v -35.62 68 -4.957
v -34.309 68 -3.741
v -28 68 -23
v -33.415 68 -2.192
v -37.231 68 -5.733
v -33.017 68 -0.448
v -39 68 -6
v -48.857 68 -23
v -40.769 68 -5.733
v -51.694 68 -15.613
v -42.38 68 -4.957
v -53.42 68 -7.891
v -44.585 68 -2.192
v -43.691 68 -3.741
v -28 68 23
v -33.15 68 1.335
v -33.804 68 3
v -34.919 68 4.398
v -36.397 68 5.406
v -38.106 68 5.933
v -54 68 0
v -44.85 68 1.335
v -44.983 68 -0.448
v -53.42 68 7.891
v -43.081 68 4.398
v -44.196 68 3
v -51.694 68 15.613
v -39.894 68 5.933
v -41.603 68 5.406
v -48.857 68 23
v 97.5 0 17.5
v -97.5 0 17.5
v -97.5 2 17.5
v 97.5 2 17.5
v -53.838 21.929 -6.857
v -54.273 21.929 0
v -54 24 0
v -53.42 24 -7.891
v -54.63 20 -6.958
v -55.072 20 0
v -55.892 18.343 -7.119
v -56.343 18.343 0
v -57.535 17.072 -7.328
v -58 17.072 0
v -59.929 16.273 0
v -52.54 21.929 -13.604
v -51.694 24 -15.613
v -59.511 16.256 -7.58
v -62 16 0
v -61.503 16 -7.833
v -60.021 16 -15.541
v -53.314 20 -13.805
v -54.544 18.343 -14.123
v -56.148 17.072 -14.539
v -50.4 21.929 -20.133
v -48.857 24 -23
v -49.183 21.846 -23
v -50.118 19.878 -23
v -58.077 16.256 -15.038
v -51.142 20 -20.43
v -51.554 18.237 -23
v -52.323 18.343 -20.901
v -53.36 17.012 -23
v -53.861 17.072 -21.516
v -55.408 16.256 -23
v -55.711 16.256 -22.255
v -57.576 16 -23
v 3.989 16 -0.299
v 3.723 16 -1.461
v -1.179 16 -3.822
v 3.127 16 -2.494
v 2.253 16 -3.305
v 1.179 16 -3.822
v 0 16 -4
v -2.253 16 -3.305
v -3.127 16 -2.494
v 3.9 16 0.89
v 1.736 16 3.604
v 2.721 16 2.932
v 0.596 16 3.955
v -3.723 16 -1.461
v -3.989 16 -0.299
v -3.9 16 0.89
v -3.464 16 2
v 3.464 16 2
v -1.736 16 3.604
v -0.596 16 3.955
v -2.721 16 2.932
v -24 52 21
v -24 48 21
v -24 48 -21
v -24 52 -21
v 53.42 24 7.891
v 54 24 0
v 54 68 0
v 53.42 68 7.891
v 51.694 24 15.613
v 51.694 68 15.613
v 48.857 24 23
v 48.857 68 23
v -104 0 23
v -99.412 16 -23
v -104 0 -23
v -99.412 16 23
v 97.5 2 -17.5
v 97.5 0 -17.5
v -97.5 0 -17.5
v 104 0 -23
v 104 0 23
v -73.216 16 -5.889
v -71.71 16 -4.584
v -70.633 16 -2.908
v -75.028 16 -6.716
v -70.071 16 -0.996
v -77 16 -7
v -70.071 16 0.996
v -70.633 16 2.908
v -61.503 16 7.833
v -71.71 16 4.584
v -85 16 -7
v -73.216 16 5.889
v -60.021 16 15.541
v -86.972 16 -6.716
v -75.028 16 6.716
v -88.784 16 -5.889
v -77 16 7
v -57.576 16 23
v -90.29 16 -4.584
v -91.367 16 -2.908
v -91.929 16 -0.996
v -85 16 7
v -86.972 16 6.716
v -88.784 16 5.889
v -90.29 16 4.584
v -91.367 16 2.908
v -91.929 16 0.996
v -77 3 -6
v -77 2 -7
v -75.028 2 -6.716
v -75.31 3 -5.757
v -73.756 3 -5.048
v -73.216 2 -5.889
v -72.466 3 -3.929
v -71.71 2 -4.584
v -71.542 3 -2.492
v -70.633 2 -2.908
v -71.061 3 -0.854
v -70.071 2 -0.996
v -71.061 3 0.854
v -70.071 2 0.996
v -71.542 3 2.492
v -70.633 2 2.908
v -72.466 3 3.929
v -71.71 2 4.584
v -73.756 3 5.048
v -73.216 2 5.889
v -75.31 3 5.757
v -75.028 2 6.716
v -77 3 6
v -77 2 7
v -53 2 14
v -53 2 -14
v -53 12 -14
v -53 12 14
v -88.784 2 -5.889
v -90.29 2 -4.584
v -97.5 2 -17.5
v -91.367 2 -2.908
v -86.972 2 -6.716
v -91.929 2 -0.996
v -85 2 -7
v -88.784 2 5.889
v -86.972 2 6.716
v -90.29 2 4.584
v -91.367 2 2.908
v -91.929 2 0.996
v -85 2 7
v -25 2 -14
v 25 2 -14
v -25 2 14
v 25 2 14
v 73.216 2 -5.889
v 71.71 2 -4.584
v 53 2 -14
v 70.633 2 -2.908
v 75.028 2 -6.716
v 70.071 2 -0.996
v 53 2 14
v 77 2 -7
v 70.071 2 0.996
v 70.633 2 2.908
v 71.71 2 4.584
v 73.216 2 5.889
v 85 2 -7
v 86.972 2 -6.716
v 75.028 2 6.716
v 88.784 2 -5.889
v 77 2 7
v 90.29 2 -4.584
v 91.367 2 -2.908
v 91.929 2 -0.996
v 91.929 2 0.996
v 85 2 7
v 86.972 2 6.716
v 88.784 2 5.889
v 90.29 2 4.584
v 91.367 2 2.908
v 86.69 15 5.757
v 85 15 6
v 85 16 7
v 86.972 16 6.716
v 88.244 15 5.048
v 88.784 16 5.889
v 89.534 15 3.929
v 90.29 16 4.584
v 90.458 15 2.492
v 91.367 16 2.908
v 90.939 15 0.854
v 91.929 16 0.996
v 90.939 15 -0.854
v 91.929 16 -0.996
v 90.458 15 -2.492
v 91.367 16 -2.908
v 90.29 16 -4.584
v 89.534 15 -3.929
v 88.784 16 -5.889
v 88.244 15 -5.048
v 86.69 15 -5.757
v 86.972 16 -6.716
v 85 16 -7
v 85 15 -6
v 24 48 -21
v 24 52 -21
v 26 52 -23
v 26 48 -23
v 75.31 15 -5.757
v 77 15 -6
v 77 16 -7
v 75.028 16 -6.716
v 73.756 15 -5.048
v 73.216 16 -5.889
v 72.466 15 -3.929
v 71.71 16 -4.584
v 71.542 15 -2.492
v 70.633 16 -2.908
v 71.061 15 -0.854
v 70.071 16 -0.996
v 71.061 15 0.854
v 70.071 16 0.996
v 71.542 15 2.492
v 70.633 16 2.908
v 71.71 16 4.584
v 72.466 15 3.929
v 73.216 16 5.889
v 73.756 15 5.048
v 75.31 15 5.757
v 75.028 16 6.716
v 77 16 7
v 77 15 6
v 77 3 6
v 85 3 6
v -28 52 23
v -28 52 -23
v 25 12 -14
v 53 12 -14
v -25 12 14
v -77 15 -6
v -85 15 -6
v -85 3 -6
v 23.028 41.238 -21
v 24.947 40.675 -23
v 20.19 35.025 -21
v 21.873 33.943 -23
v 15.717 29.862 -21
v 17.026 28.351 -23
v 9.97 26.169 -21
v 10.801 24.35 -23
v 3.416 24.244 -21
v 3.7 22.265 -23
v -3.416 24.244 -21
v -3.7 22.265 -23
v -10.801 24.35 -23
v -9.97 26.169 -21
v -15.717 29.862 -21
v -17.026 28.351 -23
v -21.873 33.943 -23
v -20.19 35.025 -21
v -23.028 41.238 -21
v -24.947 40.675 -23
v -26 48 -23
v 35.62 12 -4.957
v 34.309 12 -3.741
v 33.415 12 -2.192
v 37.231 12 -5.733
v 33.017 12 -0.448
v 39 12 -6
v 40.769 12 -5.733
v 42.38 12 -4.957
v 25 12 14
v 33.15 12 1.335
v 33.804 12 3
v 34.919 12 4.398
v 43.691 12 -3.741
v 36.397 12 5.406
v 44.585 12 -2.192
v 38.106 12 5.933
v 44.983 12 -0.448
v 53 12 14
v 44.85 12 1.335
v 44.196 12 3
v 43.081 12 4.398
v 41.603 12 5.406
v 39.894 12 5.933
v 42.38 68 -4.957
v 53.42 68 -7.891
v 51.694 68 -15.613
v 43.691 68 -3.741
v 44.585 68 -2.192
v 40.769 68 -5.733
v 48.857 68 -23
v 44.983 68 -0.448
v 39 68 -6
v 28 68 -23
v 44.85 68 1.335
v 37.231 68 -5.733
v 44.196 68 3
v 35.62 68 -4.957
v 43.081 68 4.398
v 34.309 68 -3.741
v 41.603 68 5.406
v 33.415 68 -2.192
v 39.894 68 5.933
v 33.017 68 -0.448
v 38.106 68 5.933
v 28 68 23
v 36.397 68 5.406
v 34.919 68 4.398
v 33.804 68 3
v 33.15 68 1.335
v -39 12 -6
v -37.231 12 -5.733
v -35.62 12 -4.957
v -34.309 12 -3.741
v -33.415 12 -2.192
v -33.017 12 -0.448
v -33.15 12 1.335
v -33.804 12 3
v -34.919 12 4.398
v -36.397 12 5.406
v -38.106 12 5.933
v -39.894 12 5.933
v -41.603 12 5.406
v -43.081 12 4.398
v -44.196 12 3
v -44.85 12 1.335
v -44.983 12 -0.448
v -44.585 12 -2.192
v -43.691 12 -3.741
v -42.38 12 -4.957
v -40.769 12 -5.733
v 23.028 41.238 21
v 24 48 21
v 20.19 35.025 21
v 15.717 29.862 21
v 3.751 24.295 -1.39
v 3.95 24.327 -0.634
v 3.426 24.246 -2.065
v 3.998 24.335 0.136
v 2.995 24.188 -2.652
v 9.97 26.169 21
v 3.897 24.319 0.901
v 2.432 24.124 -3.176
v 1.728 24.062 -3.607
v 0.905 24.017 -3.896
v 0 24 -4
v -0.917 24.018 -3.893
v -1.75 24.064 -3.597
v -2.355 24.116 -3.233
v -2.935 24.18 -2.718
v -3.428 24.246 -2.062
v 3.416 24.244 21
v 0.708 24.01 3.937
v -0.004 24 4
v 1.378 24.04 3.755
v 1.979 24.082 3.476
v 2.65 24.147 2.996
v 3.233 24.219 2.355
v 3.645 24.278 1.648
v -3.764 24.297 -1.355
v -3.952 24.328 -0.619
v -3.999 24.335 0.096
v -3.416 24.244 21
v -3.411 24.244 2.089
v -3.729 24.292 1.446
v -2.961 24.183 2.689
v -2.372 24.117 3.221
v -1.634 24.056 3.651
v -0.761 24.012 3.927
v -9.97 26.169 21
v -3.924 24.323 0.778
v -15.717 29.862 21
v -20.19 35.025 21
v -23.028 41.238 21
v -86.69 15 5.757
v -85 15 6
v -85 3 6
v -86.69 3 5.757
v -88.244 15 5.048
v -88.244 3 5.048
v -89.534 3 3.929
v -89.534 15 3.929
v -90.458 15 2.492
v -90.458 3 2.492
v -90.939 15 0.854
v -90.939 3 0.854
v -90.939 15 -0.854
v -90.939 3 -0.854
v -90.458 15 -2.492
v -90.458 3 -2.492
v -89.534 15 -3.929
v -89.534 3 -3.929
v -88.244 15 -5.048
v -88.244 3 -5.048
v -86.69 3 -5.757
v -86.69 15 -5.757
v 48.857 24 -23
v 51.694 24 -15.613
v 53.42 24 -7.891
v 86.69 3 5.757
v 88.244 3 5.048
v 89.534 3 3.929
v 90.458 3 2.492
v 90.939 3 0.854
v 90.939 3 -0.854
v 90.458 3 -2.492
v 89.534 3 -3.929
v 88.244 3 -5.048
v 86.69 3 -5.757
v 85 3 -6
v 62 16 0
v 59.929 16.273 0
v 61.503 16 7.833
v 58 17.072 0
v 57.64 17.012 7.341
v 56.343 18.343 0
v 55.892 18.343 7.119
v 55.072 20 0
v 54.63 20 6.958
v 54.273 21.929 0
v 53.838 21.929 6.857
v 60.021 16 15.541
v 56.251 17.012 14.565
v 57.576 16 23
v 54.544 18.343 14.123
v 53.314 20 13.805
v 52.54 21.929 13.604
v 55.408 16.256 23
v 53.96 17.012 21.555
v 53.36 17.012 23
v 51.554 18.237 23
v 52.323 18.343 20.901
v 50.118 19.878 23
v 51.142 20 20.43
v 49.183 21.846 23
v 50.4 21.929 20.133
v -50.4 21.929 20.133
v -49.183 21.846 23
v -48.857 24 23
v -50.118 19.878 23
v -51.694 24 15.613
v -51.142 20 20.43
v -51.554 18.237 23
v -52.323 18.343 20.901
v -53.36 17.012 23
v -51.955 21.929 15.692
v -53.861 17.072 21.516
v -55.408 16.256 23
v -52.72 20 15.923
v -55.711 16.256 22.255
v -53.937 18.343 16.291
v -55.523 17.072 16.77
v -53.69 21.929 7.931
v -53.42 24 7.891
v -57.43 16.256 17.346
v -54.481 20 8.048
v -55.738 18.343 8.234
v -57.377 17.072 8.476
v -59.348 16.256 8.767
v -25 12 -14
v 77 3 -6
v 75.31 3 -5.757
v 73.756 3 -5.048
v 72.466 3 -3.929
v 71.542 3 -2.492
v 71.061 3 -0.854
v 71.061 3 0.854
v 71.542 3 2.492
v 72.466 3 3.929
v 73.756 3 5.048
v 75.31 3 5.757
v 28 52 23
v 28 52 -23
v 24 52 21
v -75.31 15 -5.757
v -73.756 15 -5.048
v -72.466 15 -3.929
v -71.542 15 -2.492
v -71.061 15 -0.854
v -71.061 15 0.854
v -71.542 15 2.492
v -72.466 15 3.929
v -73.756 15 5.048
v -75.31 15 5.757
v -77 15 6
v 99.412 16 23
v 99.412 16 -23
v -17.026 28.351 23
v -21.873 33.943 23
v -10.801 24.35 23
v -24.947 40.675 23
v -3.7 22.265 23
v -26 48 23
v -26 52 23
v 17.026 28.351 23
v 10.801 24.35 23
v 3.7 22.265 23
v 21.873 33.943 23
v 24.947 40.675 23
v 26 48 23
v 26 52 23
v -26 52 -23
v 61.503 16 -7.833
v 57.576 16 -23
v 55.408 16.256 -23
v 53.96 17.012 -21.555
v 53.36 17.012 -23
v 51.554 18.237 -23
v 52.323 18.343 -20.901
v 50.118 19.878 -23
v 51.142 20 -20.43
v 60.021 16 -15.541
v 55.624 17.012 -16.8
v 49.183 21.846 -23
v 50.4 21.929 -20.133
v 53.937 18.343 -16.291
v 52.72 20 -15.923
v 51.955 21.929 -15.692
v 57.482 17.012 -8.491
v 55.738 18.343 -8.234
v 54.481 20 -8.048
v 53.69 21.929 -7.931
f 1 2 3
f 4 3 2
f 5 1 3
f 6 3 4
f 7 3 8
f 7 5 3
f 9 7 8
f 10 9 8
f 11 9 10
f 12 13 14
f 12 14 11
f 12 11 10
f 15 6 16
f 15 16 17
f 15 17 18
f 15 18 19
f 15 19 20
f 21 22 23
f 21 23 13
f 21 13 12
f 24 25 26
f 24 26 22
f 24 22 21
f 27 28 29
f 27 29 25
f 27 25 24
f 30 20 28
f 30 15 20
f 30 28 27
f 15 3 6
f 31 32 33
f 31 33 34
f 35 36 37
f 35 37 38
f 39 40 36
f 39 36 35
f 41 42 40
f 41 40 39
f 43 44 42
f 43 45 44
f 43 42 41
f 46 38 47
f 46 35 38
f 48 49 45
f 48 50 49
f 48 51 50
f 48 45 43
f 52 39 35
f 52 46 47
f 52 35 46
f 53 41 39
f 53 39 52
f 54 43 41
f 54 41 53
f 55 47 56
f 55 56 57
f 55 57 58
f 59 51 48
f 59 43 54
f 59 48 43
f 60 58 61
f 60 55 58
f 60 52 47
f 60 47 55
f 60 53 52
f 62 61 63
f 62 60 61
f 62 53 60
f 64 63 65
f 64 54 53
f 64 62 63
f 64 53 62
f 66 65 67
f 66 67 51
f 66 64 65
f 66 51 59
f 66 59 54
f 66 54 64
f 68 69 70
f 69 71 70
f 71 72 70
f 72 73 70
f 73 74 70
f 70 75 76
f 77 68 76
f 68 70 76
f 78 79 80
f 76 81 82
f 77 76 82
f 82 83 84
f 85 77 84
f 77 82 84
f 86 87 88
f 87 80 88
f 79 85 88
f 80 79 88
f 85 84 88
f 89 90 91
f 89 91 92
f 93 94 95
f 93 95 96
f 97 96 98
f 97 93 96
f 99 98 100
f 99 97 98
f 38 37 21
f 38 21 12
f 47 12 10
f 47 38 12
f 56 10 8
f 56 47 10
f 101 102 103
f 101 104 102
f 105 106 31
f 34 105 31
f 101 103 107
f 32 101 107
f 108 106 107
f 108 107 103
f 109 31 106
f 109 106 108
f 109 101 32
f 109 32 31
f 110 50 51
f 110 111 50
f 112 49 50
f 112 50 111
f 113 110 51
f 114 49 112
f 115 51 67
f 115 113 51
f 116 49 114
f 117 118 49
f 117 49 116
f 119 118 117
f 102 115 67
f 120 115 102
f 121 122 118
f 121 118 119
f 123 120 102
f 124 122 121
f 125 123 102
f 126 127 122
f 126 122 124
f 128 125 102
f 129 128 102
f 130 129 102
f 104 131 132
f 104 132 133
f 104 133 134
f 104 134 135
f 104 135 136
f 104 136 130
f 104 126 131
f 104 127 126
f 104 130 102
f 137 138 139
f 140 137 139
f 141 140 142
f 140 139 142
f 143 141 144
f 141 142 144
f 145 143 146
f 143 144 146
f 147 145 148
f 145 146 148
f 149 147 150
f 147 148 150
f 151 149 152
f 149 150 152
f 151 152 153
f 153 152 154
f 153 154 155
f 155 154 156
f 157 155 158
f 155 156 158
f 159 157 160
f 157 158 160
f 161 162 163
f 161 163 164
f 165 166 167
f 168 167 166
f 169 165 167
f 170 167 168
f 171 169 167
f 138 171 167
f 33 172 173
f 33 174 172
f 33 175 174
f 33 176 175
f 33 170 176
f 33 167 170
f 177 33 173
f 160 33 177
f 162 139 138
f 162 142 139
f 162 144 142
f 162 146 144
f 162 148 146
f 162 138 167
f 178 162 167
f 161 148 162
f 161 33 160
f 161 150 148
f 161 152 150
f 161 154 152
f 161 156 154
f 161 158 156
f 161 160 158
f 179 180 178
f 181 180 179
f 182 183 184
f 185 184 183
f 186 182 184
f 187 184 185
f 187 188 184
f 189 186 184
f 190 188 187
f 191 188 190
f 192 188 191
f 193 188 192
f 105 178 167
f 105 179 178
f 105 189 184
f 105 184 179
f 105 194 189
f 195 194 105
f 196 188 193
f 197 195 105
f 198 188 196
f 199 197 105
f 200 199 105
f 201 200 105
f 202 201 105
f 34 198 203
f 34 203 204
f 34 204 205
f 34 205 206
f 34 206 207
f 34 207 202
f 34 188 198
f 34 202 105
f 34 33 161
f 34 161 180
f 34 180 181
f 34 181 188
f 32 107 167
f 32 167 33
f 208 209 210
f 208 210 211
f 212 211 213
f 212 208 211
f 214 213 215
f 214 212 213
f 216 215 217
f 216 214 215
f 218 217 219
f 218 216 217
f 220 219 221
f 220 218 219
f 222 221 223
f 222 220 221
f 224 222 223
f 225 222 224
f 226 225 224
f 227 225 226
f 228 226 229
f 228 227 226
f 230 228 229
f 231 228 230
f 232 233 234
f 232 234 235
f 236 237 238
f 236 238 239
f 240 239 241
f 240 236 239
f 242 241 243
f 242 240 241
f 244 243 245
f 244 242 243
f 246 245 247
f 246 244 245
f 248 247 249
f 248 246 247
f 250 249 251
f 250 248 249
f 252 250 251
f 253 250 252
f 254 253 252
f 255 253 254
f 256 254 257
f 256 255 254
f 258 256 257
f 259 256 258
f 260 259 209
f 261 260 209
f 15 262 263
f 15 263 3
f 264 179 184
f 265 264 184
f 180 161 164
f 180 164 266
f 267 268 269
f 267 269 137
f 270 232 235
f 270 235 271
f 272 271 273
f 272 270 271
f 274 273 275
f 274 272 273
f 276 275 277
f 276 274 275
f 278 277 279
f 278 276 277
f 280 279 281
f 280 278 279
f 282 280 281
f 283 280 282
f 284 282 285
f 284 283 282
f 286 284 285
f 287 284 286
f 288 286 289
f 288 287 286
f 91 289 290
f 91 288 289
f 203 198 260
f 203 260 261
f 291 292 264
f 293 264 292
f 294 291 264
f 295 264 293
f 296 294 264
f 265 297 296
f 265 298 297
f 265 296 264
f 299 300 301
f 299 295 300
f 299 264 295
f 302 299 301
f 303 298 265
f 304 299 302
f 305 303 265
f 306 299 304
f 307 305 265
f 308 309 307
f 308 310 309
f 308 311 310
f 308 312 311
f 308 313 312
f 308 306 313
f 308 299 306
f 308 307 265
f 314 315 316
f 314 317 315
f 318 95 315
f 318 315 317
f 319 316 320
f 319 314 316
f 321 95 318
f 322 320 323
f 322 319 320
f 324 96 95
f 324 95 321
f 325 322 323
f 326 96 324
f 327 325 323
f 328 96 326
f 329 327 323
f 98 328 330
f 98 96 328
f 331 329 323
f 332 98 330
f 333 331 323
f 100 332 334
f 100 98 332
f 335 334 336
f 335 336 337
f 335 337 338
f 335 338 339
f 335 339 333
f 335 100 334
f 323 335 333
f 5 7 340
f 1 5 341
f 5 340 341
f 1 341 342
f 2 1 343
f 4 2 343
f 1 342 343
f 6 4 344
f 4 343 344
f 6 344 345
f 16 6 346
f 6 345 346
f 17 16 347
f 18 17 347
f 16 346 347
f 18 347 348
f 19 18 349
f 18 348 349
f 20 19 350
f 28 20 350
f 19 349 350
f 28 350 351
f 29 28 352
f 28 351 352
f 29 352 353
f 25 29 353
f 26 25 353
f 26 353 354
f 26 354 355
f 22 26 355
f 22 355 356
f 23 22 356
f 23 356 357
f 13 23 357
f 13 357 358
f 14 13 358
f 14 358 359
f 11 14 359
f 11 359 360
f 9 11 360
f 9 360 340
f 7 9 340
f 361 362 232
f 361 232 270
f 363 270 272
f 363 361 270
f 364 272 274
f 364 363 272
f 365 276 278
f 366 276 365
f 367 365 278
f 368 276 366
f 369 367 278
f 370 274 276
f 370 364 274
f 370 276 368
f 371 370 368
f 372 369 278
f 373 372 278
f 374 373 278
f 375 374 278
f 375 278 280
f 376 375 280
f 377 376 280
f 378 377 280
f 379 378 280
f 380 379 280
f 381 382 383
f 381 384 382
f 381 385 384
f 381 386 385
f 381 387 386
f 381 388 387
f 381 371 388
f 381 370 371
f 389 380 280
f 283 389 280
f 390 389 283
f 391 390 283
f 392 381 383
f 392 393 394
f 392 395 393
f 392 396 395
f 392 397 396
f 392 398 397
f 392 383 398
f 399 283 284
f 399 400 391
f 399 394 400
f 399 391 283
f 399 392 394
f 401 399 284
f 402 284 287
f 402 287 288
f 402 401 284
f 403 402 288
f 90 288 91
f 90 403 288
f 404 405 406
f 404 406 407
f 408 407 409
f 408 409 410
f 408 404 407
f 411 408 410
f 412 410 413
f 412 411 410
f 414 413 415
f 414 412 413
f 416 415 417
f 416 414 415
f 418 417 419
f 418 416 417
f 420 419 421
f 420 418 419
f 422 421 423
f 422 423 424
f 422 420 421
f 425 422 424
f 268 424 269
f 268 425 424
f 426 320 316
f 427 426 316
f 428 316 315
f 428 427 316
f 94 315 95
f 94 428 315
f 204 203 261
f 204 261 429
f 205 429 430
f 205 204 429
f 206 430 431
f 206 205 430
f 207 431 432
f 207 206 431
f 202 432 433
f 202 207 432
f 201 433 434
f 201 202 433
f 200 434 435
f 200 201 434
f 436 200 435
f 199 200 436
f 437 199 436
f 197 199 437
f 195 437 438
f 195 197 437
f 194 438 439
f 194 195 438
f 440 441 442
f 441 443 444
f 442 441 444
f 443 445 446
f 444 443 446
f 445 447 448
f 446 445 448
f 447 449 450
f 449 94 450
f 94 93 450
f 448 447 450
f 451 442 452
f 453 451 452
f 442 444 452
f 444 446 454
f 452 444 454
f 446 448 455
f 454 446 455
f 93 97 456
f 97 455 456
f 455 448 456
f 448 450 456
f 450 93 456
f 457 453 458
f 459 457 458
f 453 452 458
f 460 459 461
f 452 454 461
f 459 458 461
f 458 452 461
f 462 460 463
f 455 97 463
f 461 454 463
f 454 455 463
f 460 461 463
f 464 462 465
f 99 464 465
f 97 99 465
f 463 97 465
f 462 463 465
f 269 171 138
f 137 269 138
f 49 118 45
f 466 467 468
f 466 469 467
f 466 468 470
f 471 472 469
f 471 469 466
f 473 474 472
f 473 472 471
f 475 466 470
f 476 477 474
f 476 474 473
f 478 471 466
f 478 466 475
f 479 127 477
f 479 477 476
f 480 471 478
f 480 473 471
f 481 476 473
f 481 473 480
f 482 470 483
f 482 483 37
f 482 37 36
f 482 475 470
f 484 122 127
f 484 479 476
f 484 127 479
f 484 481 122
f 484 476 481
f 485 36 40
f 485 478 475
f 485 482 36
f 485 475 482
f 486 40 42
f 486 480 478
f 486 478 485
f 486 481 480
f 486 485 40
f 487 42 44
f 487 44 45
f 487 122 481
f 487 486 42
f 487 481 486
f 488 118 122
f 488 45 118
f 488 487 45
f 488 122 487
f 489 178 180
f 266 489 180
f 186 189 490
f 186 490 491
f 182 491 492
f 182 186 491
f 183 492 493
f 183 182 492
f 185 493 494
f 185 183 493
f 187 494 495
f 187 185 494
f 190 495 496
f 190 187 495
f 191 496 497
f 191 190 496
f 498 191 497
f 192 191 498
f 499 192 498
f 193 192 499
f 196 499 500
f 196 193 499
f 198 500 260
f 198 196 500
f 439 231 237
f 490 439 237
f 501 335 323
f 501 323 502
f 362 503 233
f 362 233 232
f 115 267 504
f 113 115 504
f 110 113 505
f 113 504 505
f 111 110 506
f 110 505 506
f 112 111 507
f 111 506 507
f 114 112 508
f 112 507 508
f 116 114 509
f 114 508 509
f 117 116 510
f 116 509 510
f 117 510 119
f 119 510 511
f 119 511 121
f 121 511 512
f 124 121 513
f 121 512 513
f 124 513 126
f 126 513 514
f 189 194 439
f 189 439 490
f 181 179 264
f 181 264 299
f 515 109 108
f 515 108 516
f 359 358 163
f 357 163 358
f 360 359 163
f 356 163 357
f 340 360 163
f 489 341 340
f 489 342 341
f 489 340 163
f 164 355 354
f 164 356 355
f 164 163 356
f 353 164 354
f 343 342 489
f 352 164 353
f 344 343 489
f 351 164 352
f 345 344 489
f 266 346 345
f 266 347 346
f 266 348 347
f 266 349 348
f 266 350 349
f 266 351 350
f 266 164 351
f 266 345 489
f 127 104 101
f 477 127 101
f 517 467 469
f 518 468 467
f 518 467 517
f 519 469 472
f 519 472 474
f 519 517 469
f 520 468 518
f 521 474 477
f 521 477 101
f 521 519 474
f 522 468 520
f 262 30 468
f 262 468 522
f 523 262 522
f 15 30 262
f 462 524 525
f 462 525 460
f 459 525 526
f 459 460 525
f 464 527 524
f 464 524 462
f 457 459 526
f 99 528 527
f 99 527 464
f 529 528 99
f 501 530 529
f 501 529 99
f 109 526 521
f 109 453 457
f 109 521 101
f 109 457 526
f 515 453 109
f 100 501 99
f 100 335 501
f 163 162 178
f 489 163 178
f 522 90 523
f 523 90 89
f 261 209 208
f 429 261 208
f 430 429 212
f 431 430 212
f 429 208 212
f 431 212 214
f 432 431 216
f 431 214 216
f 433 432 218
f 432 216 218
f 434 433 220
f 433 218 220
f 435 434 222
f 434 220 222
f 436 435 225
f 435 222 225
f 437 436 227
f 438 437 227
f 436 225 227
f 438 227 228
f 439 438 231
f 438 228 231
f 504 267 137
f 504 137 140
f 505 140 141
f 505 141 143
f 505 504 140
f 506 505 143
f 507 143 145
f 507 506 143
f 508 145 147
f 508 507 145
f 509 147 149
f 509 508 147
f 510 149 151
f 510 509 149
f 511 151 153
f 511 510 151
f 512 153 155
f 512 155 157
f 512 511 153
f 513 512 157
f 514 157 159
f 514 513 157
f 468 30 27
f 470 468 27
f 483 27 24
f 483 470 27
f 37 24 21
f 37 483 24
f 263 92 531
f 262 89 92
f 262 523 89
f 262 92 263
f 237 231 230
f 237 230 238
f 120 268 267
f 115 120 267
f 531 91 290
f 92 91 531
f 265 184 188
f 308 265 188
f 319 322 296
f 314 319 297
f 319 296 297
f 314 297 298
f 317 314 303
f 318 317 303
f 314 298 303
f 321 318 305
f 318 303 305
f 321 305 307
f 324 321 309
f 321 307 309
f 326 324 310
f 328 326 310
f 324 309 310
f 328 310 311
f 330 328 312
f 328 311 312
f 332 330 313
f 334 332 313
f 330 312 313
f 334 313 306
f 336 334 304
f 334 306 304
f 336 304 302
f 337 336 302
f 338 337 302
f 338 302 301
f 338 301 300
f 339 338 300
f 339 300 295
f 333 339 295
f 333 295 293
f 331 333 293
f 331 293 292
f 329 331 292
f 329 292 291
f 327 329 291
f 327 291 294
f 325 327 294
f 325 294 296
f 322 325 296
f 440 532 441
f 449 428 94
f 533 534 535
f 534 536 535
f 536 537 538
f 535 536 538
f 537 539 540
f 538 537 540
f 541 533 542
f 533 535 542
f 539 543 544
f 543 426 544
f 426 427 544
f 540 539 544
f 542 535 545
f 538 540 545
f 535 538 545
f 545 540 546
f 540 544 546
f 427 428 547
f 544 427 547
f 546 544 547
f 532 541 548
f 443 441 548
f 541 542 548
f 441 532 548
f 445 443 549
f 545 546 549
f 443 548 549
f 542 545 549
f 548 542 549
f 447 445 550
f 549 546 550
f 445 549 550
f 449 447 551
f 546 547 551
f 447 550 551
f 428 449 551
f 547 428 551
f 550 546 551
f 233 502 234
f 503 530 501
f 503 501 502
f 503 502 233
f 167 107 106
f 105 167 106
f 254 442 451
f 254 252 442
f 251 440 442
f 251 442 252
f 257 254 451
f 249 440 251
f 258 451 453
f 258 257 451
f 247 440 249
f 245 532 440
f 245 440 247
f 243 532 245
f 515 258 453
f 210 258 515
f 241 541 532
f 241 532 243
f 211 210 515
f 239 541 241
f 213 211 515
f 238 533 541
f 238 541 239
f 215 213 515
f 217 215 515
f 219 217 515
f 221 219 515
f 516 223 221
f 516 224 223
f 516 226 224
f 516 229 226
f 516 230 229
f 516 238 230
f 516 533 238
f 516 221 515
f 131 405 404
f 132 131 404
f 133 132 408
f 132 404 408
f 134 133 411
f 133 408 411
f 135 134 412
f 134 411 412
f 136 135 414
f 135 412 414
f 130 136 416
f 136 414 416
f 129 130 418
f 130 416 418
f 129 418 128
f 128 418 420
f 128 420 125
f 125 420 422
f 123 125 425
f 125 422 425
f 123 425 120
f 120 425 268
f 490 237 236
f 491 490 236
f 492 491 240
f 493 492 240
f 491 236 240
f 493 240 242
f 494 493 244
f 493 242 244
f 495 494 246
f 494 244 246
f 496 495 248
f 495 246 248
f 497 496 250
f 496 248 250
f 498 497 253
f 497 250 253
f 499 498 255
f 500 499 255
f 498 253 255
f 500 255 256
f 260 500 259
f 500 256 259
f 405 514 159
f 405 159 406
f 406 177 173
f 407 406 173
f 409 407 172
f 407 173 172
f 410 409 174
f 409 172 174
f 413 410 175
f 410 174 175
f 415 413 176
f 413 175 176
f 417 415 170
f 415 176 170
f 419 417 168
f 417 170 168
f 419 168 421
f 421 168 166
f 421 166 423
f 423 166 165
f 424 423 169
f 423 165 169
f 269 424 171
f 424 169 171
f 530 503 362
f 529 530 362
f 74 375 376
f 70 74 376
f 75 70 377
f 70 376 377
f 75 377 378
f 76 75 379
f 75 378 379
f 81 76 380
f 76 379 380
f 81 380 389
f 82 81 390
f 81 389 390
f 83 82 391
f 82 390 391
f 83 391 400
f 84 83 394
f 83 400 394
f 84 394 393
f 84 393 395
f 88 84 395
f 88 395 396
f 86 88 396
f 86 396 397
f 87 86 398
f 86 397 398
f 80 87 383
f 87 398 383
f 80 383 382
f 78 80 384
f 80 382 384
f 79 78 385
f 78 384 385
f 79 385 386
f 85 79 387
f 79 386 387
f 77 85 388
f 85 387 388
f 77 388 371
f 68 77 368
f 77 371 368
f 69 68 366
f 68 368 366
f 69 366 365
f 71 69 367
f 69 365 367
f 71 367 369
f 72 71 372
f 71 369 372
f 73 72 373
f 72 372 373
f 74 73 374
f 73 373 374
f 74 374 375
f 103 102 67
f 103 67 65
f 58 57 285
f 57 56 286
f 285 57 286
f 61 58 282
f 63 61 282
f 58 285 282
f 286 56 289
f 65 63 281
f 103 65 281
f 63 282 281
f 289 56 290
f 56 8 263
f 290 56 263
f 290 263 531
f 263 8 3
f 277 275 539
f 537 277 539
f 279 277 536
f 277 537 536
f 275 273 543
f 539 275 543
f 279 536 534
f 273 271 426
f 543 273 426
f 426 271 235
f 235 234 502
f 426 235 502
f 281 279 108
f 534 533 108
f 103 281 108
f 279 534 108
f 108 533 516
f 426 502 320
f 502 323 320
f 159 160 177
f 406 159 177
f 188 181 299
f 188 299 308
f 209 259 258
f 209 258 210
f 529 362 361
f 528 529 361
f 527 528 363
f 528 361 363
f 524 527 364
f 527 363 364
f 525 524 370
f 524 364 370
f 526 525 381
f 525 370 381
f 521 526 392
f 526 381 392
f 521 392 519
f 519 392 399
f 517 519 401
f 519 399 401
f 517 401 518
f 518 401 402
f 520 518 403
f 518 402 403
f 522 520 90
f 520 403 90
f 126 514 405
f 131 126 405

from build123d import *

# Parameters (mm, degrees)
BOSS_EXTRUDE1_DEPTH = 23
CUT_EXTRUDE1_START  = -52
CUT_EXTRUDE1_DEPTH  = 52
SKETCH3_W           = 195
SKETCH3_H           = 35
CUT_EXTRUDE2_DEPTH  = 2
FILLET1_R           = 8
CUT_EXTRUDE3_REACH  = 120.528
CHAMFER1_SIZE       = 1
SKETCH16_W          = 28
SKETCH16_H          = 28
SKETCH16_R          = 6
CUT_EXTRUDE4_DEPTH  = 10
SKETCH16_3_R        = 6
CUT_EXTRUDE5_DEPTH  = 126.303631386
CHAMFER2_SIZE       = 2
SKETCH20_W          = 4
SKETCH20_H          = 9


# Read off the part's stored shape, not the designer's step: Cut-Extrude1
with BuildPart() as part:
    # Sketch1 → Boss-Extrude1 (new, symmetric)
    with BuildSketch(Plane.XY):
        Polygon((-104, 0), (104, 0), (99.412073828, 16), (-99.412073828, 16), align=None)
        with BuildLine():
            Line((-54, 68), (-54, 16))
            Line((-54, 16), (54, 16))
            Line((54, 16), (54, 68))
            Line((54, 68), (28, 68))
            Line((28, 68), (28, 52))
            Line((28, 52), (24, 52))
            Line((24, 52), (24, 48))
            ThreePointArc((24, 48), (0, 24), (-24, 48))
            Line((-24, 48), (-24, 52))
            Line((-24, 52), (-28, 52))
            Line((-28, 52), (-28, 68))
            Line((-28, 68), (-54, 68))
        make_face()
    extrude(amount=BOSS_EXTRUDE1_DEPTH, both=True)

    # Cut-Extrude1 outline → Cut-Extrude1 (cut)
    with BuildSketch(Plane(origin=(0, 68, 0), x_dir=(1, 0, 0), z_dir=(0, 1, 0)).offset(CUT_EXTRUDE1_START)):
        with BuildLine():
            ThreePointArc((-54, 0), (-52.698550436, 11.784005345), (-48.856934001, 23))
            Line((-48.856934001, 23), (-54, 23))
            Line((-54, 23), (-54, 0))
        make_face()
        with BuildLine():
            ThreePointArc((-48.856934001, -23), (-52.698550436, -11.784005345), (-54, 0))
            Line((-54, 0), (-54, -23))
            Line((-54, -23), (-48.856934001, -23))
        make_face()
        with BuildLine():
            Line((54, 23), (48.856934001, 23))
            ThreePointArc((48.856934001, 23), (52.698550436, 11.784005345), (54, 0))
            Line((54, 0), (54, 23))
        make_face()
        with BuildLine():
            Line((54, -23), (54, 0))
            ThreePointArc((54, 0), (52.698550436, -11.784005345), (48.856934001, -23))
            Line((48.856934001, -23), (54, -23))
        make_face()
    extrude(amount=CUT_EXTRUDE1_DEPTH, mode=Mode.SUBTRACT)

    # Sketch3 → Cut-Extrude2 (cut)
    with BuildSketch(Plane.XZ):
        Rectangle(SKETCH3_W, SKETCH3_H)
    extrude(amount=-CUT_EXTRUDE2_DEPTH, mode=Mode.SUBTRACT)

    # Fillet1
    fillet1_edges = [part.edges().sort_by_distance(p)[0] for p in [
        (52.698550436, 16, -11.784005345),
        (-52.698550436, 16, -11.784005345),
    ]]
    fillet(fillet1_edges, radius=FILLET1_R)

    # Sketch4 → Cut-Extrude3 (cut, up to next)
    with BuildSketch(Plane(origin=(0, 16, 0), x_dir=(1, 0, 0), z_dir=(0, 1, 0)), mode=Mode.PRIVATE) as cut_extrude3_sk1:
        with BuildLine():
            Line((-85, 6), (-77, 6))
            ThreePointArc((-77, 6), (-71, 0), (-77, -6))
            Line((-77, -6), (-85, -6))
            ThreePointArc((-85, -6), (-91, 0), (-85, 6))
        make_face()
    cut_extrude3_tool1 = extrude(cut_extrude3_sk1.sketch, amount=-CUT_EXTRUDE3_REACH, mode=Mode.PRIVATE) & part.part
    # Sketch4 → Cut-Extrude3 (cut, up to next)
    with BuildSketch(Plane(origin=(0, 16, 0), x_dir=(1, 0, 0), z_dir=(0, 1, 0)), mode=Mode.PRIVATE) as cut_extrude3_sk2:
        with BuildLine():
            Line((85, 6), (77, 6))
            ThreePointArc((77, 6), (71, 0), (77, -6))
            Line((77, -6), (85, -6))
            ThreePointArc((85, -6), (91, 0), (85, 6))
        make_face()
    cut_extrude3_tool2 = extrude(cut_extrude3_sk2.sketch, amount=-CUT_EXTRUDE3_REACH, mode=Mode.PRIVATE) & part.part
    add(cut_extrude3_tool1.solids().sort_by_distance((-81, 16, 0))[0], mode=Mode.SUBTRACT)
    add(cut_extrude3_tool2.solids().sort_by_distance((81, 16, 0))[0], mode=Mode.SUBTRACT)

    # Chamfer1
    chamfer1_edges = [part.edges().sort_by_distance(p)[0] for p in [
        (-91, 16, 0),
        (-81, 16, 6),
        (-71, 16, 0),
        (-81, 16, -6),
        (-81, 2, 6),
        (-91, 2, 0),
        (-81, 2, -6),
        (-71, 2, 0),
        (91, 16, 0),
        (81, 16, -6),
        (71, 16, 0),
        (81, 16, 6),
        (81, 2, -6),
        (91, 2, 0),
        (81, 2, 6),
        (71, 2, 0),
    ]]
    chamfer(chamfer1_edges, length=CHAMFER1_SIZE)

    # Sketch16 → Cut-Extrude4 (cut)
    # profile 1 of 2: a face of its own
    with BuildSketch(Plane.XZ.offset(-2)):
        with Locations((-39, 0)):
            Rectangle(SKETCH16_W, SKETCH16_H)
        with Locations(Location((-39, 0, 0), (0, 0, 270))):
            Circle(SKETCH16_R, mode=Mode.SUBTRACT)
    # profile 2 of 2: a face of its own
    with BuildSketch(Plane.XZ.offset(-2)):
        with Locations((39, 0)):
            Rectangle(SKETCH16_W, SKETCH16_H)
        with Locations(Location((39, 0, 0), (0, 0, 270))):
            Circle(SKETCH16_R, mode=Mode.SUBTRACT)
    extrude(amount=-CUT_EXTRUDE4_DEPTH, mode=Mode.SUBTRACT)

    # Sketch16<3> → Cut-Extrude5 (cut, through all)
    with BuildSketch(Plane.XZ.offset(-2)):
        with Locations(Location((-39, 0, 0), (0, 0, 270))):
            Circle(SKETCH16_3_R)
        with Locations(Location((39, 0, 0), (0, 0, 270))):
            Circle(SKETCH16_3_R)
    extrude(amount=-CUT_EXTRUDE5_DEPTH, mode=Mode.SUBTRACT)

    # Chamfer2
    chamfer2_edges = [part.edges().sort_by_distance(p)[0] for p in [
        (-24, 50, -23),
        (0, 24, -23),
        (24, 50, -23),
        (24, 50, 23),
        (0, 24, 23),
        (-24, 50, 23),
    ]]
    chamfer(chamfer2_edges, length=CHAMFER2_SIZE)

    # Sketch20 → Ø8.0mm Dowel Hole5 (revolve, cut)
    with BuildSketch(Plane(origin=(0, 16, 0), x_dir=(0, 0, -1), z_dir=(1, 0, 0))):
        with Locations((2, 4.5)):
            Rectangle(SKETCH20_W, SKETCH20_H)
    revolve(axis=Axis((0, 9.65, 0), (0, 1, 0)), mode=Mode.SUBTRACT)


solid = part.part
